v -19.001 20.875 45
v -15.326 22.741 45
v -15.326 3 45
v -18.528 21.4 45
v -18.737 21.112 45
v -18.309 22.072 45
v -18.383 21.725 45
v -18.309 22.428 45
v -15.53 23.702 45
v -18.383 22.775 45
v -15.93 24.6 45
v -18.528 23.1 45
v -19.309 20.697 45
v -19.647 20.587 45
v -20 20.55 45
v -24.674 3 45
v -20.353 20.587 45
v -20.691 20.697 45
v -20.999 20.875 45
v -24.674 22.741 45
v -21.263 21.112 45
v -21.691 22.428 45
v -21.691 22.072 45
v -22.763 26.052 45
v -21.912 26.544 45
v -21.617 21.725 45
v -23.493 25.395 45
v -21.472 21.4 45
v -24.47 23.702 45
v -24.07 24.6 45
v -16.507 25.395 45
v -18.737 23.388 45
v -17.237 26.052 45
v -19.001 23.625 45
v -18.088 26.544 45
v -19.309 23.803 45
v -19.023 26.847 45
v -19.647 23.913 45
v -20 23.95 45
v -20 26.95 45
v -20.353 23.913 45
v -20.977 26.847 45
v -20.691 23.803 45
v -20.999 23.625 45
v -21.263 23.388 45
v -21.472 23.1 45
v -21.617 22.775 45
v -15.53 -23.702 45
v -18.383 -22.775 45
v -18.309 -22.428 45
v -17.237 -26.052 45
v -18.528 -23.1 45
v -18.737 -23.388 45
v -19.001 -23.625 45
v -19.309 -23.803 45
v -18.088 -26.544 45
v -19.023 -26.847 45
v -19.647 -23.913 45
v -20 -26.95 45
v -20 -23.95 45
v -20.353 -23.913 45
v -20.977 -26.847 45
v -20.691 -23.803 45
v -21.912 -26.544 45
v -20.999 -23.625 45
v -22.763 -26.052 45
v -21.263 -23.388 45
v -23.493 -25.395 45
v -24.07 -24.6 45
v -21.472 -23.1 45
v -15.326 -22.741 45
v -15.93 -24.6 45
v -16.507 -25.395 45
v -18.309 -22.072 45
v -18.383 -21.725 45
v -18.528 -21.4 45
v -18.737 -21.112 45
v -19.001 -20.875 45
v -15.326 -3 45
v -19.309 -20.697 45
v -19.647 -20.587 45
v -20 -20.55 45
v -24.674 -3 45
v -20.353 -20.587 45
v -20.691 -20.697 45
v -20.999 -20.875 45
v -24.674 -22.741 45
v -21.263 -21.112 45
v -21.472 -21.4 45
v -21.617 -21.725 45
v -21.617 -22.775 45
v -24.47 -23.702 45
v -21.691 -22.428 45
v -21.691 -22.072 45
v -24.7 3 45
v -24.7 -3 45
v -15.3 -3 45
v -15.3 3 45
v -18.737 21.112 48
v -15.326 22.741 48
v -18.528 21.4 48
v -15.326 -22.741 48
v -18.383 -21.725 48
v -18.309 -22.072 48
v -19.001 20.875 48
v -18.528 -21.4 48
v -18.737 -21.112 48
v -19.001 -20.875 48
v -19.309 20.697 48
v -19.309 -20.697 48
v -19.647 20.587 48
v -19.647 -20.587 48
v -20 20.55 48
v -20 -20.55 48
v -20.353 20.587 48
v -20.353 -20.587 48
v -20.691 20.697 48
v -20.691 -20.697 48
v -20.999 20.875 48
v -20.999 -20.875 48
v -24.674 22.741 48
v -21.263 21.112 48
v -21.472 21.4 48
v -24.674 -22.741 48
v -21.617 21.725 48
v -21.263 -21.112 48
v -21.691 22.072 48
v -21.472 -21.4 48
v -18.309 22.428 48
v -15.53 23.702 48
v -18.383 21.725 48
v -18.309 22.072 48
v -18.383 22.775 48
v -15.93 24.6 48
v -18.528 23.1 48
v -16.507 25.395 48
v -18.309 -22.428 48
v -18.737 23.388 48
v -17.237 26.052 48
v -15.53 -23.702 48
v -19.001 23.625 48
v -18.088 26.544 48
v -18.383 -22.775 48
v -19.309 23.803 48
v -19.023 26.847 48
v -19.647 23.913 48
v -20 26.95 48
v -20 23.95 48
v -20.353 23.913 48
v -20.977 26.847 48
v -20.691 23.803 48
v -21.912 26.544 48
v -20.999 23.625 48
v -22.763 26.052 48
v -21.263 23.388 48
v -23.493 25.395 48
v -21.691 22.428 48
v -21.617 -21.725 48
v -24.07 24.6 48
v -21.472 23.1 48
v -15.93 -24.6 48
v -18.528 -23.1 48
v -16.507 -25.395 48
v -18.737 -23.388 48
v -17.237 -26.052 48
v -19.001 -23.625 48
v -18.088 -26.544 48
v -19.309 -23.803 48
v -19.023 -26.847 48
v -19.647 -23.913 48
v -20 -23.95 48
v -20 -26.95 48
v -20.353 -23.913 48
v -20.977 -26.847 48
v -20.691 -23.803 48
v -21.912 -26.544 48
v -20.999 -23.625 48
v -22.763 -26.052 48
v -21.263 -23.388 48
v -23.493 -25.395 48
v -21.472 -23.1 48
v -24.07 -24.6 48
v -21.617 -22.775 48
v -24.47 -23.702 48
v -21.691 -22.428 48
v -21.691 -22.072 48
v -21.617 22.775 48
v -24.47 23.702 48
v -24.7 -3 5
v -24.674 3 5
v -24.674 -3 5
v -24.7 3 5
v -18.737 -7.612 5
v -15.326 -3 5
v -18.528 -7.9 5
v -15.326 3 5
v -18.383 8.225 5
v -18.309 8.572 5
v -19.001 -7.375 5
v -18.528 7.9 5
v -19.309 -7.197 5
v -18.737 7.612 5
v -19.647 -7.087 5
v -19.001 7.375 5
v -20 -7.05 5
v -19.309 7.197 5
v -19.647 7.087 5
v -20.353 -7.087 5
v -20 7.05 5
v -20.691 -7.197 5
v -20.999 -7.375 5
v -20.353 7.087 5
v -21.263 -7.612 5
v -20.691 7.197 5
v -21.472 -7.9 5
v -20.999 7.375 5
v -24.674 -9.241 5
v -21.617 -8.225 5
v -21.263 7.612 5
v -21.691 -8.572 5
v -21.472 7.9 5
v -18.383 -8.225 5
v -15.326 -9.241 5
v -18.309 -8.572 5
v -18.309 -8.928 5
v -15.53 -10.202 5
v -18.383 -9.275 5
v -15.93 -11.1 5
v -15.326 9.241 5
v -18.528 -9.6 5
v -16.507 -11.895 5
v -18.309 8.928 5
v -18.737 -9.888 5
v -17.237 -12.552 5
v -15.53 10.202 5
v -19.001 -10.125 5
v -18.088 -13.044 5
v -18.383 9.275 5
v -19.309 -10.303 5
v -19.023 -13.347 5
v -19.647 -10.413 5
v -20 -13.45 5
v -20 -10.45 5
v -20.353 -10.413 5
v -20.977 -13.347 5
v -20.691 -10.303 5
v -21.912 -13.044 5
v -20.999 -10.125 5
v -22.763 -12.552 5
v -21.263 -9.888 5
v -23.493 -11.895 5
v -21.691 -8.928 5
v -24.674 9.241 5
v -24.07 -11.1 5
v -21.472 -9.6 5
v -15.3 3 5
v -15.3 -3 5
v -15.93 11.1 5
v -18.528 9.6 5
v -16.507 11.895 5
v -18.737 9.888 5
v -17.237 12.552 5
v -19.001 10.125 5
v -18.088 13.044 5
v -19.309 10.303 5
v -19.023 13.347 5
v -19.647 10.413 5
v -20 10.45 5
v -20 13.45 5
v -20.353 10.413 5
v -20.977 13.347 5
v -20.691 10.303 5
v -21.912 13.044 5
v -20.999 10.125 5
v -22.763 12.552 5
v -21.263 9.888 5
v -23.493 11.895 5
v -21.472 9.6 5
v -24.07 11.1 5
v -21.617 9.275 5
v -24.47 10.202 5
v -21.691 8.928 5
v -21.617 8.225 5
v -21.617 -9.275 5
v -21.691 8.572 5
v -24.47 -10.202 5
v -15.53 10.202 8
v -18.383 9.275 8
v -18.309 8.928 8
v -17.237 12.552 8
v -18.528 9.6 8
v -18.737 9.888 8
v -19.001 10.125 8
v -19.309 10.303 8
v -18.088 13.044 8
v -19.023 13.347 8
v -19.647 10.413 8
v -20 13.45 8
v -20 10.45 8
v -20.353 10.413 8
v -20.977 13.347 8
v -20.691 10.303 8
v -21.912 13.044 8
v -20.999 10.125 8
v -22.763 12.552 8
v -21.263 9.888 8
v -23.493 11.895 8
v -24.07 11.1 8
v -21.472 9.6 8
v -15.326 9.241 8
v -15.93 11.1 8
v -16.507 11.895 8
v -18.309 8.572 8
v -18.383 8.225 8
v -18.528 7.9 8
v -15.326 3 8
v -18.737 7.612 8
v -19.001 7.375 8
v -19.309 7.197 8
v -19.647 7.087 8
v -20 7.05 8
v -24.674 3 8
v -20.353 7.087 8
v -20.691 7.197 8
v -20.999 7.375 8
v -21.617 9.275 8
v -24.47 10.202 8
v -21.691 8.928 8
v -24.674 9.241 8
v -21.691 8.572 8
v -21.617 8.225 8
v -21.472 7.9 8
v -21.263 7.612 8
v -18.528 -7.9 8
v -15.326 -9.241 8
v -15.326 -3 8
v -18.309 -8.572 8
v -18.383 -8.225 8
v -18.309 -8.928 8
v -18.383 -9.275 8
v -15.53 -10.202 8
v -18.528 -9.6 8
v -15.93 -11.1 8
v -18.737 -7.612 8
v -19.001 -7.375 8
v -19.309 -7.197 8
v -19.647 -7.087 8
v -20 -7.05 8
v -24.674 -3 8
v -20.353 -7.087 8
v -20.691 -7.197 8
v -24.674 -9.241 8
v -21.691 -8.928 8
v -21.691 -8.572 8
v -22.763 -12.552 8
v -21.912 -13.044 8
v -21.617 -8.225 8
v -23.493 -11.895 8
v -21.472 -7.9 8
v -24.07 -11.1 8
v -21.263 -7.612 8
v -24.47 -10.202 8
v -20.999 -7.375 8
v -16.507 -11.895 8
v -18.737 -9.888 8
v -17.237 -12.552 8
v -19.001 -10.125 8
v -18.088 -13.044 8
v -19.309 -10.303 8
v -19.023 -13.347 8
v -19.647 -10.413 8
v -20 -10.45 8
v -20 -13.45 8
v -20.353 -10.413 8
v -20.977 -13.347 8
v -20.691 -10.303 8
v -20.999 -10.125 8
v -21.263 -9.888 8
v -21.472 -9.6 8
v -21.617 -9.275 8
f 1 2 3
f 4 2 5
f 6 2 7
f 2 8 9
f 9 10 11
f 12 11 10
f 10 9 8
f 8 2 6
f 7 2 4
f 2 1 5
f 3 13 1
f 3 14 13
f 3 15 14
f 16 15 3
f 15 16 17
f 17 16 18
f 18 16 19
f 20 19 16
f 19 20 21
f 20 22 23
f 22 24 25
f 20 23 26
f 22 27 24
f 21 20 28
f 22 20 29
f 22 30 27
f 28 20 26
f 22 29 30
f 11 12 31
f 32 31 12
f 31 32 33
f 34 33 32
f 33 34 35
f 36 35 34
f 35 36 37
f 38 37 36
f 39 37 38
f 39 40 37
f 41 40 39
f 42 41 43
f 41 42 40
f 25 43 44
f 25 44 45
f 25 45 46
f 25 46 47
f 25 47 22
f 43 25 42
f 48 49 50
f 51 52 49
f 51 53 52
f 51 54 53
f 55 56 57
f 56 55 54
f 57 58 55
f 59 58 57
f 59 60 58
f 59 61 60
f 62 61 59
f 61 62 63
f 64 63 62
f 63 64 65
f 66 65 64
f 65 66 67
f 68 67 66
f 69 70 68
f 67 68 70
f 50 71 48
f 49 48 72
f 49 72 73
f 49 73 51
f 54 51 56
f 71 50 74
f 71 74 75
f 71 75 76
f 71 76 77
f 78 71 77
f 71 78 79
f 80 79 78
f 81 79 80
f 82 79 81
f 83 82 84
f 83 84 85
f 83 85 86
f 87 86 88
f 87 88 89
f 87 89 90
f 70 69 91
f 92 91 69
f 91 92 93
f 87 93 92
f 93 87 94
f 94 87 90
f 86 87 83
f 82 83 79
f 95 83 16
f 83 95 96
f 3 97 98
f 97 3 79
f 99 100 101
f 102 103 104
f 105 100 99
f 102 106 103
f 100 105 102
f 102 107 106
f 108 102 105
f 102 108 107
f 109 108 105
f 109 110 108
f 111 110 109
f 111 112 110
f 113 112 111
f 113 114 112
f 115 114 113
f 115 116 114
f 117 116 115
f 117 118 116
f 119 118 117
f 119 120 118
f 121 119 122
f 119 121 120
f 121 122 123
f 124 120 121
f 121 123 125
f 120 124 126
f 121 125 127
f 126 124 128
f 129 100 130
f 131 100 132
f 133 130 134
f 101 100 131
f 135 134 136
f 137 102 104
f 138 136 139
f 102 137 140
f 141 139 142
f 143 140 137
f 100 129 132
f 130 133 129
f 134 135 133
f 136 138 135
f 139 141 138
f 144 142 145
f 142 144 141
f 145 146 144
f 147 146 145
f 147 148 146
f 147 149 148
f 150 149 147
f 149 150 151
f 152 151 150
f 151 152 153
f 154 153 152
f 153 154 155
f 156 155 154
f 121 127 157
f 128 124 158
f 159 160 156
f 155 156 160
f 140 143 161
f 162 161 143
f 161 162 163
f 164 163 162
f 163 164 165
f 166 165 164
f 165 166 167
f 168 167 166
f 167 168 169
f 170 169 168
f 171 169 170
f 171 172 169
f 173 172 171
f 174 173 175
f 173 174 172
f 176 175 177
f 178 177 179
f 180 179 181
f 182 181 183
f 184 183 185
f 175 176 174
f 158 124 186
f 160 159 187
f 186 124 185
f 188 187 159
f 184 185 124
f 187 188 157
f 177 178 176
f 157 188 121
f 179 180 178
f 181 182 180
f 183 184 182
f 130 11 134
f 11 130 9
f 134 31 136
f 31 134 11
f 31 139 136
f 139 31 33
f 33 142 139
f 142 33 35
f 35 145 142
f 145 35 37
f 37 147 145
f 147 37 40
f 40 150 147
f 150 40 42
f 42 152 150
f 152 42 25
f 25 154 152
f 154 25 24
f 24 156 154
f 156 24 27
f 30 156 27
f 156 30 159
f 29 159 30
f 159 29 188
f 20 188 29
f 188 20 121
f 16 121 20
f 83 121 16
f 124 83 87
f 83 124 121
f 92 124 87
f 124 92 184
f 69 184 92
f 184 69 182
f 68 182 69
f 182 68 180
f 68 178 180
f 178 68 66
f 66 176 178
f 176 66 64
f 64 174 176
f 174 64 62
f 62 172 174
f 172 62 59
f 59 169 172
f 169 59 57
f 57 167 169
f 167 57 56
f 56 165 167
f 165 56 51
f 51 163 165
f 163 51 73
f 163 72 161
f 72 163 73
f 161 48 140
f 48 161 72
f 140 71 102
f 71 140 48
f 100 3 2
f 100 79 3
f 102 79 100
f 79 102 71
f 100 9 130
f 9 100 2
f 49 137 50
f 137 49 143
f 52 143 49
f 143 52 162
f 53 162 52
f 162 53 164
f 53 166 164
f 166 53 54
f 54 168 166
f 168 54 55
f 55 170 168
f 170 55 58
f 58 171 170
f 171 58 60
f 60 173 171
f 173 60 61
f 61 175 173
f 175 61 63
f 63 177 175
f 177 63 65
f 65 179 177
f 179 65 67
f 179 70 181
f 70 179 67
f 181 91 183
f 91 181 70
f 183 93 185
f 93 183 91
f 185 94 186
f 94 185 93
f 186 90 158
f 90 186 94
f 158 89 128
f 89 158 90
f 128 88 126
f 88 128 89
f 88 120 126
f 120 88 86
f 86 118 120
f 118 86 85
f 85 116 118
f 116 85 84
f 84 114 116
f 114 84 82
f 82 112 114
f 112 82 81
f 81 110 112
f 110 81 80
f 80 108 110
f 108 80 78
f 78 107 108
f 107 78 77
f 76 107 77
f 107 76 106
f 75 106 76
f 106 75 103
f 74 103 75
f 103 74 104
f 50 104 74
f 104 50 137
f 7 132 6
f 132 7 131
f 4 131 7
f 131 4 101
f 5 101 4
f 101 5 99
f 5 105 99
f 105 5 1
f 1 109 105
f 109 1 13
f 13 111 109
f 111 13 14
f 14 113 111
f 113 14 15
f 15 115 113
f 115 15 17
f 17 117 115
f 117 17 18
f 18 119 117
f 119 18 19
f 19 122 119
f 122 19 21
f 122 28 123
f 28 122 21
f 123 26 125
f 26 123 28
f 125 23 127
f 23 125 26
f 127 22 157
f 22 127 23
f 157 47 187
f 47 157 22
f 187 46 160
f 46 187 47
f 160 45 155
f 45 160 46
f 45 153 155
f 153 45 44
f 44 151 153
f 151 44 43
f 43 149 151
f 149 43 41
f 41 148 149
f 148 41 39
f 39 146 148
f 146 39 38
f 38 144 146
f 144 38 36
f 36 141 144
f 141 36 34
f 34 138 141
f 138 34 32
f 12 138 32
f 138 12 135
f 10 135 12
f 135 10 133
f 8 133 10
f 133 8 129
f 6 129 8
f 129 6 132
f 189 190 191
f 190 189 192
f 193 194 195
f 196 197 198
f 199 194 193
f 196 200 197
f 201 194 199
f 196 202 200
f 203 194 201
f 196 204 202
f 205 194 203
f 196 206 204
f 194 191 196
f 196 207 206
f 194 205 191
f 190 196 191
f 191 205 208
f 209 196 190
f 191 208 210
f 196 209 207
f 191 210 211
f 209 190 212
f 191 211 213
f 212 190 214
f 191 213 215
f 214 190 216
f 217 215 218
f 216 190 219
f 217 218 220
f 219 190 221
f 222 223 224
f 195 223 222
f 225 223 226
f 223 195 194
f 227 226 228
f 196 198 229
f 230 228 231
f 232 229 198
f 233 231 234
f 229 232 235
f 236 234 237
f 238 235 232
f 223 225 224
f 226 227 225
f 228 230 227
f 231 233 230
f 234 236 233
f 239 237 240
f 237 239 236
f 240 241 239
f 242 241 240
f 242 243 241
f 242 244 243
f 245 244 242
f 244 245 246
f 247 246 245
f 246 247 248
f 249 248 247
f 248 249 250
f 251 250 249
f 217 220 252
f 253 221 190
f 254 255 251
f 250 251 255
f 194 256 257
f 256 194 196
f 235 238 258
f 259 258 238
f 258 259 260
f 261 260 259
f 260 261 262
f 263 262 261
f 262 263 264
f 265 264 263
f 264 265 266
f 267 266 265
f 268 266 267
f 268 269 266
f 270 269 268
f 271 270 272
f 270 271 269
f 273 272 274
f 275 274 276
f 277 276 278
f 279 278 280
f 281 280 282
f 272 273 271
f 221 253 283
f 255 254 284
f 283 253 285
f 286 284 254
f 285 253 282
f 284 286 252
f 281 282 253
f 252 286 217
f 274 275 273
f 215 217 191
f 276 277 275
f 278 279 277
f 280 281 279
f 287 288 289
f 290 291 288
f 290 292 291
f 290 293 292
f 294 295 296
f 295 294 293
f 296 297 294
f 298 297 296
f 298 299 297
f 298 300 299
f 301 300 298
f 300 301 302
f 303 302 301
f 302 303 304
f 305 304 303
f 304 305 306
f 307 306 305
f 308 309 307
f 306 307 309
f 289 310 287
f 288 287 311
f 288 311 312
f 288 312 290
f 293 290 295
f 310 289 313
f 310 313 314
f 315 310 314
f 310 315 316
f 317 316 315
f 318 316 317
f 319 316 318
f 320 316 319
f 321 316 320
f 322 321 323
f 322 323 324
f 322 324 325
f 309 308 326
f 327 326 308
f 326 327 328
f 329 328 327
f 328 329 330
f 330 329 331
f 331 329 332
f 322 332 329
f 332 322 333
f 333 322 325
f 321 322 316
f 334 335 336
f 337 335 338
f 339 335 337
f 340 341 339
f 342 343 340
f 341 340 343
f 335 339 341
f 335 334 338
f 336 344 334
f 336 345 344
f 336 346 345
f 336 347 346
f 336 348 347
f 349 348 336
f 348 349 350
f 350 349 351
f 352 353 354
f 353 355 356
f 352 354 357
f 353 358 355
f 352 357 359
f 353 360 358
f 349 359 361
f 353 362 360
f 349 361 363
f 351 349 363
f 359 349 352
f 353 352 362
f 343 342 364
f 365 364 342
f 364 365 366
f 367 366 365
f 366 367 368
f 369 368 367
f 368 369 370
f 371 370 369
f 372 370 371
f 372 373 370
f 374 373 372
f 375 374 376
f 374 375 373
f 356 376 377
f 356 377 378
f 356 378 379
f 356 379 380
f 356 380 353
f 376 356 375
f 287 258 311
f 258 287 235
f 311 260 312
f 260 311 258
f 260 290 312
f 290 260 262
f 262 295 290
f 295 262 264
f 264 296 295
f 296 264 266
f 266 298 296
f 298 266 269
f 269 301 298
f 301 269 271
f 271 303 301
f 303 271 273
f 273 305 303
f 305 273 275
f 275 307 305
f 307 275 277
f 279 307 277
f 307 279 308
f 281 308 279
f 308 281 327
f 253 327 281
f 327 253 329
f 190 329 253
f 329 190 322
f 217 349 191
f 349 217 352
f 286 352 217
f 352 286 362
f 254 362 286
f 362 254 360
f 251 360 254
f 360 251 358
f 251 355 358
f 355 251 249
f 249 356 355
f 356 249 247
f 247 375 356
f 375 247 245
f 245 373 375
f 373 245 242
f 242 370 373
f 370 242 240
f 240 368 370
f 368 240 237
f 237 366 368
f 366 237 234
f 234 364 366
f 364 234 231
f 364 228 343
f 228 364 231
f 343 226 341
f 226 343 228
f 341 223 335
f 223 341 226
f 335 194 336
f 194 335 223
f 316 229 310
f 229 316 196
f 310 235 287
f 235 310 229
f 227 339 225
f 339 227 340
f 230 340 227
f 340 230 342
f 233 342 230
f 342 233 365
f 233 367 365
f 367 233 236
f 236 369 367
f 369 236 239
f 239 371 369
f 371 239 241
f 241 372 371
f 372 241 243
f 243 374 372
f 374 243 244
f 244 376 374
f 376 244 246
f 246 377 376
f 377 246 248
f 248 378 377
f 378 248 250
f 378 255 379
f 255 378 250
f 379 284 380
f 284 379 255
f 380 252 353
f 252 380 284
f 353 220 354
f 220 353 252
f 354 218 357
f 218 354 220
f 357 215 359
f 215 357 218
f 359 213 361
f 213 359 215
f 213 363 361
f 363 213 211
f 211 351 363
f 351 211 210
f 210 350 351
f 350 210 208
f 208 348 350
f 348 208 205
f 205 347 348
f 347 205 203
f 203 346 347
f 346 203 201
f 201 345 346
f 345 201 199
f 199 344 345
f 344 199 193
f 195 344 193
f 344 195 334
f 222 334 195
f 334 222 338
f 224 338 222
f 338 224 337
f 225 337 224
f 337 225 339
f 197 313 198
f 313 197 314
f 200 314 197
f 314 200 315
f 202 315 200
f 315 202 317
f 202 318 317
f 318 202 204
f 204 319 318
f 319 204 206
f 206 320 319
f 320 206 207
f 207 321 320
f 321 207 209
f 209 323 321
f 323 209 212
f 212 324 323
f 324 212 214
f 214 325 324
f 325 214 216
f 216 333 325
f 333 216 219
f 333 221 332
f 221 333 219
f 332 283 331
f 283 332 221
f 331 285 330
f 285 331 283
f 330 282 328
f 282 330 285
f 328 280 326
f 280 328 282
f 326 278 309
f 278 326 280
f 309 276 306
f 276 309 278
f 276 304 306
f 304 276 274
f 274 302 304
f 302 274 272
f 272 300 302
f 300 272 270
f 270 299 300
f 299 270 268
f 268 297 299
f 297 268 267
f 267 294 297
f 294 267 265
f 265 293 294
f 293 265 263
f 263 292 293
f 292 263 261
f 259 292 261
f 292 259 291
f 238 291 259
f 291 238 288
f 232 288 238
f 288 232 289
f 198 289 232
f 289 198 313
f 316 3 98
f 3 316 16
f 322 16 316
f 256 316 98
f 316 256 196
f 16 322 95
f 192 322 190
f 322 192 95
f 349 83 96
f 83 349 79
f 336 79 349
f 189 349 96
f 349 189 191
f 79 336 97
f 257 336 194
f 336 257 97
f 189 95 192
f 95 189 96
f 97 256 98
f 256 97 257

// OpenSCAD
// file: include.scad
/*
This file contains all variables of the project that may be interesting to change
*/


// motor-base union
function mbu_padding() = 5; // radius around the screws
function mbu_size_m() = 8;
function mbu_size_b() = 11;
function mbu_r() = 0;
function mbu_th() = 3;
function mbu_screw_dst() = 17.5;
function mbu_num_screws_m() = 3;
function mbu_num_screws_b() = 3;


// base
function base_sep() = 40; // separation between top and bottom bases
function base_type() = "B"; // A or B
function base_size() = 2;
function base_length(bs=base_size()) = bs*30+10;
function base_num_extra_screws(bs=base_size()) = bs*3+1;
function base_width() = mbu_screw_dst();
function base_th() = 5;
function base_num_screws_mbu() = mbu_num_screws_b();
function base_padding() = mbu_padding();
function base_total_width() = base_width() + screw_r()*2 + base_padding();

// Battery case holder
function acc_dst() = 15.4;
function bch_base_screw_dst() = mbu_screw_dst();
function bch_case_screw_dst() = 44.5;
function bch_th() = mbu_th();
function bch_r() = 3;

// LM2596
function lm2596_dst_x() = 30;
function lm2596_dst_y() = 16;




echo("mbu screw2screw:", mbu_screw_dst());
echo("base width (screw to screw):", base_length());



// distance from screw to screw on a motor
function base_screw_dst() = 15;
// screw radius
function screw_r() = 3/2+0.2;
// distance from screw to screw on the base
// (in the wheel axis direction)
function base_screw_dst() = 100;
    
// file: battery_case_holder.scad
include <include.scad>

module battery_case_holder() {
    bdst = bch_base_screw_dst();
    cdst = bch_case_screw_dst();
    r = bch_r();
    w = 2*(r+screw_r());
    h = 40;
    $fn = 30;
 
    module line(dst) {
        linear_extrude(height=bch_th())
        difference() {
            hull() {
                translate([-dst/2,0,0]) circle(r=r+screw_r());
                translate([+dst/2,0,0]) circle(r=r+screw_r());
            }
            translate([-dst/2,0,0]) circle(r=screw_r());
            translate([+dst/2,0,0]) circle(r=screw_r());
        }
    }
    
    
    module base() {
        translate([0,0,h])
        line(cdst);
        
        line(bdst);
        
        translate([0,0,h/2])
        cube([r*2,w,h], true);
    }
    
    rotate(90) translate([0,0,base_th()]) base();
}

//battery_case_holder();
// file: base.scad
include <include.scad>


module base2d(type, size) {
    bl = base_length(size);
    r = base_padding() + screw_r();
    
    module c(x, y, r) {
        translate([x*bl/2,y*base_width()/2])
        circle(r=r);
    }
    
    module cc(x, y, r) {
        translate([x-bl/2,y-base_width()/2])
        circle(r=r);
    }
    
    module screws() {
        x = base_num_extra_screws(size);
        y = base_num_screws_mbu();
        l = bl / (x-1);
        w = base_width() / (y-1);
        for (i = [0:x-1]) {
            for (j = [0:y-1]) {
                if (i != floor(x/2) || type == "A")
                cc(x = l*i, y = w*j, r = screw_r(), $fn=20);
            }
        }
        
        // big gaps
        if (type == "B")
        for (i = [0:floor(x/3)-1]) {
            hull() {
                cc(x = l*i*3+l*2, y = 0, r = screw_r(), $fn=20);
                cc(x = l*i*3+l, y = 0, r = screw_r(), $fn=20);
                cc(x = l*i*3+l*2, y = base_width(), r = screw_r(), $fn=20);
                cc(x = l*i*3+l, y = base_width(), r = screw_r(), $fn=20);
            } 
        }
    }
    
    difference() {
        hull() {
            c(1,1, r); c(1,-1, r); c(-1,1, r); c(-1,-1, r);
        }
        screws();
    }
}

module base(type=base_type(), size=base_size()) {
    linear_extrude(height=base_th()) base2d(type, size);
}
// file: motor_base_union.scad
include <include.scad>

h = mbu_screw_dst()+2*mbu_padding()+2*screw_r();

module half2d(w, ns) {
    
    module c(d, r) {
        translate([w,d]) circle(r=r);
    }
    module cyl(x, r) {
        c(x*mbu_screw_dst()/2, r);
    }
    difference() {
        union() {
            translate([w/2,0,0])
            square([w,h], true);
            hull() {
                cyl(1, screw_r()+mbu_padding());
                cyl(-1, screw_r()+mbu_padding());
            }
        }
        
        for (i = [0:ns-1]) {
            d = mbu_screw_dst()/(ns-1)*i;
            c(mbu_screw_dst()/2-d,screw_r(), $fn=30);
        }
//        cyl(1,screw_r(), $fn=20);
//        cyl(-1, screw_r(), $fn=20);
    }
}

module half(w, ns) {
    r = mbu_r();
    translate([r,0,0])
    linear_extrude(height=mbu_th())
    half2d(w, ns);
}


module join(r) {
    intersection() {
        translate([r/2,0,-r/2])
        cube([r,h,r], true);
        translate([r,0,-r])
        rotate([90,0,0])
        difference() {
            cylinder(r=r, h = h, center=true);
            cylinder(r=r-mbu_th(), h = h, center=true);
        }
    }
}

module motor_base_union(b=mbu_size_b(), m=mbu_size_m()) {
    join(r=5, $fn=20);
    join(r=0);
   
    translate([0,0,-mbu_th()])
    half(b, mbu_num_screws_b());
    rotate([0,90,0])
    half(m, mbu_num_screws_m());
}

//motor_base_union();
// main file
include <motor_base_union.scad>
include <base.scad>
include <battery_case_holder.scad>
include <motor_base_union.scad>


module mbus() {
    sep = base_length(base_size()) + mbu_size_b()*2;
    
    translate([-sep/2,0,0])
    motor_base_union();

    translate([sep/2,0,0])
    rotate(180)
    motor_base_union();
}


module multibase(n) {
    x = 100;
    for (i = [1:n]) {
        translate([x,0])
        translate([0,40*(i-0.5-n/2)]) base("A", i);
        
        translate([-x,0])
        rotate(180)
        translate([0,40*(i-0.5-n/2)]) base("B", i);
    }
}




module fingers2d(coords, ir = screw_r(), or = screw_r()+3) {
    
    for (i = [0:len(coords)-2]) {
        difference() {
            hull() {
                translate(coords[i]) circle(r=or);
                translate(coords[i+1]) circle(r=or);
            }
            translate(coords[i]) circle(r=ir);
            translate(coords[i+1]) circle(r=ir);
        }
    }
}

module acc_holder() {
    linear_extrude(2) fingers2d([
        [mbu_screw_dst(),0],
        [0,0],
        [0,acc_dst()],
    ]);
}


module lm2596_holder() {
    linear_extrude(2) fingers2d([
        [0,0],
        [mbu_screw_dst(),0],
        [lm2596_dst_x(),lm2596_dst_y()],
    ]);
}

module esp8266_holder() {
    dim = [22.5,3.2,5];
    translate([0,0,dim[2]/2])
    difference() {
        cube(dim+[3,2,0],true);
        cube(dim,true);
    }
    
    translate([-mbu_screw_dst()/2,5.4,0])
    linear_extrude(5) fingers2d([
        [0,0],
        [mbu_screw_dst(),0],
    ], or=screw_r()+2, $fn=30);
}


module screw(l = 15, head=true) {
    $fn = 20;
    color("red") {
        if(head)
        translate([0,0,-2])
        cylinder(r=3, h = 2);
        
        cylinder(r=screw_r(), h=l);
    }
}


module dup(v) {
    mirror(v) children();
    children();
}
module show_screws() {
    
    dup([0,1,0]) dup([1,0,0])
    translate([base_length()/2,base_width()/2,base_th()]) rotate([0,180,0]) screw();
    dup([0,1,0])
    translate([0,base_width()/2,base_th()+3]) rotate([0,180,0]) screw();
}

//show_screws();

/*
battery_case_holder();
esp8266_holder();
*/

lm2596_holder($fn=30);
translate([11,13,0])
rotate(180) lm2596_holder($fn=30);
//lm2596_holder($fn=30);
//esp8266_holder();
//battery_case_holder();


!union() {
    //lm2596_holder();
    //translate([0,20,0]) acc_holder();
    
    translate([-20,0,0]) battery_case_holder();
    //translate([0,-30,0]) esp8266_holder();
}

//base("A");
